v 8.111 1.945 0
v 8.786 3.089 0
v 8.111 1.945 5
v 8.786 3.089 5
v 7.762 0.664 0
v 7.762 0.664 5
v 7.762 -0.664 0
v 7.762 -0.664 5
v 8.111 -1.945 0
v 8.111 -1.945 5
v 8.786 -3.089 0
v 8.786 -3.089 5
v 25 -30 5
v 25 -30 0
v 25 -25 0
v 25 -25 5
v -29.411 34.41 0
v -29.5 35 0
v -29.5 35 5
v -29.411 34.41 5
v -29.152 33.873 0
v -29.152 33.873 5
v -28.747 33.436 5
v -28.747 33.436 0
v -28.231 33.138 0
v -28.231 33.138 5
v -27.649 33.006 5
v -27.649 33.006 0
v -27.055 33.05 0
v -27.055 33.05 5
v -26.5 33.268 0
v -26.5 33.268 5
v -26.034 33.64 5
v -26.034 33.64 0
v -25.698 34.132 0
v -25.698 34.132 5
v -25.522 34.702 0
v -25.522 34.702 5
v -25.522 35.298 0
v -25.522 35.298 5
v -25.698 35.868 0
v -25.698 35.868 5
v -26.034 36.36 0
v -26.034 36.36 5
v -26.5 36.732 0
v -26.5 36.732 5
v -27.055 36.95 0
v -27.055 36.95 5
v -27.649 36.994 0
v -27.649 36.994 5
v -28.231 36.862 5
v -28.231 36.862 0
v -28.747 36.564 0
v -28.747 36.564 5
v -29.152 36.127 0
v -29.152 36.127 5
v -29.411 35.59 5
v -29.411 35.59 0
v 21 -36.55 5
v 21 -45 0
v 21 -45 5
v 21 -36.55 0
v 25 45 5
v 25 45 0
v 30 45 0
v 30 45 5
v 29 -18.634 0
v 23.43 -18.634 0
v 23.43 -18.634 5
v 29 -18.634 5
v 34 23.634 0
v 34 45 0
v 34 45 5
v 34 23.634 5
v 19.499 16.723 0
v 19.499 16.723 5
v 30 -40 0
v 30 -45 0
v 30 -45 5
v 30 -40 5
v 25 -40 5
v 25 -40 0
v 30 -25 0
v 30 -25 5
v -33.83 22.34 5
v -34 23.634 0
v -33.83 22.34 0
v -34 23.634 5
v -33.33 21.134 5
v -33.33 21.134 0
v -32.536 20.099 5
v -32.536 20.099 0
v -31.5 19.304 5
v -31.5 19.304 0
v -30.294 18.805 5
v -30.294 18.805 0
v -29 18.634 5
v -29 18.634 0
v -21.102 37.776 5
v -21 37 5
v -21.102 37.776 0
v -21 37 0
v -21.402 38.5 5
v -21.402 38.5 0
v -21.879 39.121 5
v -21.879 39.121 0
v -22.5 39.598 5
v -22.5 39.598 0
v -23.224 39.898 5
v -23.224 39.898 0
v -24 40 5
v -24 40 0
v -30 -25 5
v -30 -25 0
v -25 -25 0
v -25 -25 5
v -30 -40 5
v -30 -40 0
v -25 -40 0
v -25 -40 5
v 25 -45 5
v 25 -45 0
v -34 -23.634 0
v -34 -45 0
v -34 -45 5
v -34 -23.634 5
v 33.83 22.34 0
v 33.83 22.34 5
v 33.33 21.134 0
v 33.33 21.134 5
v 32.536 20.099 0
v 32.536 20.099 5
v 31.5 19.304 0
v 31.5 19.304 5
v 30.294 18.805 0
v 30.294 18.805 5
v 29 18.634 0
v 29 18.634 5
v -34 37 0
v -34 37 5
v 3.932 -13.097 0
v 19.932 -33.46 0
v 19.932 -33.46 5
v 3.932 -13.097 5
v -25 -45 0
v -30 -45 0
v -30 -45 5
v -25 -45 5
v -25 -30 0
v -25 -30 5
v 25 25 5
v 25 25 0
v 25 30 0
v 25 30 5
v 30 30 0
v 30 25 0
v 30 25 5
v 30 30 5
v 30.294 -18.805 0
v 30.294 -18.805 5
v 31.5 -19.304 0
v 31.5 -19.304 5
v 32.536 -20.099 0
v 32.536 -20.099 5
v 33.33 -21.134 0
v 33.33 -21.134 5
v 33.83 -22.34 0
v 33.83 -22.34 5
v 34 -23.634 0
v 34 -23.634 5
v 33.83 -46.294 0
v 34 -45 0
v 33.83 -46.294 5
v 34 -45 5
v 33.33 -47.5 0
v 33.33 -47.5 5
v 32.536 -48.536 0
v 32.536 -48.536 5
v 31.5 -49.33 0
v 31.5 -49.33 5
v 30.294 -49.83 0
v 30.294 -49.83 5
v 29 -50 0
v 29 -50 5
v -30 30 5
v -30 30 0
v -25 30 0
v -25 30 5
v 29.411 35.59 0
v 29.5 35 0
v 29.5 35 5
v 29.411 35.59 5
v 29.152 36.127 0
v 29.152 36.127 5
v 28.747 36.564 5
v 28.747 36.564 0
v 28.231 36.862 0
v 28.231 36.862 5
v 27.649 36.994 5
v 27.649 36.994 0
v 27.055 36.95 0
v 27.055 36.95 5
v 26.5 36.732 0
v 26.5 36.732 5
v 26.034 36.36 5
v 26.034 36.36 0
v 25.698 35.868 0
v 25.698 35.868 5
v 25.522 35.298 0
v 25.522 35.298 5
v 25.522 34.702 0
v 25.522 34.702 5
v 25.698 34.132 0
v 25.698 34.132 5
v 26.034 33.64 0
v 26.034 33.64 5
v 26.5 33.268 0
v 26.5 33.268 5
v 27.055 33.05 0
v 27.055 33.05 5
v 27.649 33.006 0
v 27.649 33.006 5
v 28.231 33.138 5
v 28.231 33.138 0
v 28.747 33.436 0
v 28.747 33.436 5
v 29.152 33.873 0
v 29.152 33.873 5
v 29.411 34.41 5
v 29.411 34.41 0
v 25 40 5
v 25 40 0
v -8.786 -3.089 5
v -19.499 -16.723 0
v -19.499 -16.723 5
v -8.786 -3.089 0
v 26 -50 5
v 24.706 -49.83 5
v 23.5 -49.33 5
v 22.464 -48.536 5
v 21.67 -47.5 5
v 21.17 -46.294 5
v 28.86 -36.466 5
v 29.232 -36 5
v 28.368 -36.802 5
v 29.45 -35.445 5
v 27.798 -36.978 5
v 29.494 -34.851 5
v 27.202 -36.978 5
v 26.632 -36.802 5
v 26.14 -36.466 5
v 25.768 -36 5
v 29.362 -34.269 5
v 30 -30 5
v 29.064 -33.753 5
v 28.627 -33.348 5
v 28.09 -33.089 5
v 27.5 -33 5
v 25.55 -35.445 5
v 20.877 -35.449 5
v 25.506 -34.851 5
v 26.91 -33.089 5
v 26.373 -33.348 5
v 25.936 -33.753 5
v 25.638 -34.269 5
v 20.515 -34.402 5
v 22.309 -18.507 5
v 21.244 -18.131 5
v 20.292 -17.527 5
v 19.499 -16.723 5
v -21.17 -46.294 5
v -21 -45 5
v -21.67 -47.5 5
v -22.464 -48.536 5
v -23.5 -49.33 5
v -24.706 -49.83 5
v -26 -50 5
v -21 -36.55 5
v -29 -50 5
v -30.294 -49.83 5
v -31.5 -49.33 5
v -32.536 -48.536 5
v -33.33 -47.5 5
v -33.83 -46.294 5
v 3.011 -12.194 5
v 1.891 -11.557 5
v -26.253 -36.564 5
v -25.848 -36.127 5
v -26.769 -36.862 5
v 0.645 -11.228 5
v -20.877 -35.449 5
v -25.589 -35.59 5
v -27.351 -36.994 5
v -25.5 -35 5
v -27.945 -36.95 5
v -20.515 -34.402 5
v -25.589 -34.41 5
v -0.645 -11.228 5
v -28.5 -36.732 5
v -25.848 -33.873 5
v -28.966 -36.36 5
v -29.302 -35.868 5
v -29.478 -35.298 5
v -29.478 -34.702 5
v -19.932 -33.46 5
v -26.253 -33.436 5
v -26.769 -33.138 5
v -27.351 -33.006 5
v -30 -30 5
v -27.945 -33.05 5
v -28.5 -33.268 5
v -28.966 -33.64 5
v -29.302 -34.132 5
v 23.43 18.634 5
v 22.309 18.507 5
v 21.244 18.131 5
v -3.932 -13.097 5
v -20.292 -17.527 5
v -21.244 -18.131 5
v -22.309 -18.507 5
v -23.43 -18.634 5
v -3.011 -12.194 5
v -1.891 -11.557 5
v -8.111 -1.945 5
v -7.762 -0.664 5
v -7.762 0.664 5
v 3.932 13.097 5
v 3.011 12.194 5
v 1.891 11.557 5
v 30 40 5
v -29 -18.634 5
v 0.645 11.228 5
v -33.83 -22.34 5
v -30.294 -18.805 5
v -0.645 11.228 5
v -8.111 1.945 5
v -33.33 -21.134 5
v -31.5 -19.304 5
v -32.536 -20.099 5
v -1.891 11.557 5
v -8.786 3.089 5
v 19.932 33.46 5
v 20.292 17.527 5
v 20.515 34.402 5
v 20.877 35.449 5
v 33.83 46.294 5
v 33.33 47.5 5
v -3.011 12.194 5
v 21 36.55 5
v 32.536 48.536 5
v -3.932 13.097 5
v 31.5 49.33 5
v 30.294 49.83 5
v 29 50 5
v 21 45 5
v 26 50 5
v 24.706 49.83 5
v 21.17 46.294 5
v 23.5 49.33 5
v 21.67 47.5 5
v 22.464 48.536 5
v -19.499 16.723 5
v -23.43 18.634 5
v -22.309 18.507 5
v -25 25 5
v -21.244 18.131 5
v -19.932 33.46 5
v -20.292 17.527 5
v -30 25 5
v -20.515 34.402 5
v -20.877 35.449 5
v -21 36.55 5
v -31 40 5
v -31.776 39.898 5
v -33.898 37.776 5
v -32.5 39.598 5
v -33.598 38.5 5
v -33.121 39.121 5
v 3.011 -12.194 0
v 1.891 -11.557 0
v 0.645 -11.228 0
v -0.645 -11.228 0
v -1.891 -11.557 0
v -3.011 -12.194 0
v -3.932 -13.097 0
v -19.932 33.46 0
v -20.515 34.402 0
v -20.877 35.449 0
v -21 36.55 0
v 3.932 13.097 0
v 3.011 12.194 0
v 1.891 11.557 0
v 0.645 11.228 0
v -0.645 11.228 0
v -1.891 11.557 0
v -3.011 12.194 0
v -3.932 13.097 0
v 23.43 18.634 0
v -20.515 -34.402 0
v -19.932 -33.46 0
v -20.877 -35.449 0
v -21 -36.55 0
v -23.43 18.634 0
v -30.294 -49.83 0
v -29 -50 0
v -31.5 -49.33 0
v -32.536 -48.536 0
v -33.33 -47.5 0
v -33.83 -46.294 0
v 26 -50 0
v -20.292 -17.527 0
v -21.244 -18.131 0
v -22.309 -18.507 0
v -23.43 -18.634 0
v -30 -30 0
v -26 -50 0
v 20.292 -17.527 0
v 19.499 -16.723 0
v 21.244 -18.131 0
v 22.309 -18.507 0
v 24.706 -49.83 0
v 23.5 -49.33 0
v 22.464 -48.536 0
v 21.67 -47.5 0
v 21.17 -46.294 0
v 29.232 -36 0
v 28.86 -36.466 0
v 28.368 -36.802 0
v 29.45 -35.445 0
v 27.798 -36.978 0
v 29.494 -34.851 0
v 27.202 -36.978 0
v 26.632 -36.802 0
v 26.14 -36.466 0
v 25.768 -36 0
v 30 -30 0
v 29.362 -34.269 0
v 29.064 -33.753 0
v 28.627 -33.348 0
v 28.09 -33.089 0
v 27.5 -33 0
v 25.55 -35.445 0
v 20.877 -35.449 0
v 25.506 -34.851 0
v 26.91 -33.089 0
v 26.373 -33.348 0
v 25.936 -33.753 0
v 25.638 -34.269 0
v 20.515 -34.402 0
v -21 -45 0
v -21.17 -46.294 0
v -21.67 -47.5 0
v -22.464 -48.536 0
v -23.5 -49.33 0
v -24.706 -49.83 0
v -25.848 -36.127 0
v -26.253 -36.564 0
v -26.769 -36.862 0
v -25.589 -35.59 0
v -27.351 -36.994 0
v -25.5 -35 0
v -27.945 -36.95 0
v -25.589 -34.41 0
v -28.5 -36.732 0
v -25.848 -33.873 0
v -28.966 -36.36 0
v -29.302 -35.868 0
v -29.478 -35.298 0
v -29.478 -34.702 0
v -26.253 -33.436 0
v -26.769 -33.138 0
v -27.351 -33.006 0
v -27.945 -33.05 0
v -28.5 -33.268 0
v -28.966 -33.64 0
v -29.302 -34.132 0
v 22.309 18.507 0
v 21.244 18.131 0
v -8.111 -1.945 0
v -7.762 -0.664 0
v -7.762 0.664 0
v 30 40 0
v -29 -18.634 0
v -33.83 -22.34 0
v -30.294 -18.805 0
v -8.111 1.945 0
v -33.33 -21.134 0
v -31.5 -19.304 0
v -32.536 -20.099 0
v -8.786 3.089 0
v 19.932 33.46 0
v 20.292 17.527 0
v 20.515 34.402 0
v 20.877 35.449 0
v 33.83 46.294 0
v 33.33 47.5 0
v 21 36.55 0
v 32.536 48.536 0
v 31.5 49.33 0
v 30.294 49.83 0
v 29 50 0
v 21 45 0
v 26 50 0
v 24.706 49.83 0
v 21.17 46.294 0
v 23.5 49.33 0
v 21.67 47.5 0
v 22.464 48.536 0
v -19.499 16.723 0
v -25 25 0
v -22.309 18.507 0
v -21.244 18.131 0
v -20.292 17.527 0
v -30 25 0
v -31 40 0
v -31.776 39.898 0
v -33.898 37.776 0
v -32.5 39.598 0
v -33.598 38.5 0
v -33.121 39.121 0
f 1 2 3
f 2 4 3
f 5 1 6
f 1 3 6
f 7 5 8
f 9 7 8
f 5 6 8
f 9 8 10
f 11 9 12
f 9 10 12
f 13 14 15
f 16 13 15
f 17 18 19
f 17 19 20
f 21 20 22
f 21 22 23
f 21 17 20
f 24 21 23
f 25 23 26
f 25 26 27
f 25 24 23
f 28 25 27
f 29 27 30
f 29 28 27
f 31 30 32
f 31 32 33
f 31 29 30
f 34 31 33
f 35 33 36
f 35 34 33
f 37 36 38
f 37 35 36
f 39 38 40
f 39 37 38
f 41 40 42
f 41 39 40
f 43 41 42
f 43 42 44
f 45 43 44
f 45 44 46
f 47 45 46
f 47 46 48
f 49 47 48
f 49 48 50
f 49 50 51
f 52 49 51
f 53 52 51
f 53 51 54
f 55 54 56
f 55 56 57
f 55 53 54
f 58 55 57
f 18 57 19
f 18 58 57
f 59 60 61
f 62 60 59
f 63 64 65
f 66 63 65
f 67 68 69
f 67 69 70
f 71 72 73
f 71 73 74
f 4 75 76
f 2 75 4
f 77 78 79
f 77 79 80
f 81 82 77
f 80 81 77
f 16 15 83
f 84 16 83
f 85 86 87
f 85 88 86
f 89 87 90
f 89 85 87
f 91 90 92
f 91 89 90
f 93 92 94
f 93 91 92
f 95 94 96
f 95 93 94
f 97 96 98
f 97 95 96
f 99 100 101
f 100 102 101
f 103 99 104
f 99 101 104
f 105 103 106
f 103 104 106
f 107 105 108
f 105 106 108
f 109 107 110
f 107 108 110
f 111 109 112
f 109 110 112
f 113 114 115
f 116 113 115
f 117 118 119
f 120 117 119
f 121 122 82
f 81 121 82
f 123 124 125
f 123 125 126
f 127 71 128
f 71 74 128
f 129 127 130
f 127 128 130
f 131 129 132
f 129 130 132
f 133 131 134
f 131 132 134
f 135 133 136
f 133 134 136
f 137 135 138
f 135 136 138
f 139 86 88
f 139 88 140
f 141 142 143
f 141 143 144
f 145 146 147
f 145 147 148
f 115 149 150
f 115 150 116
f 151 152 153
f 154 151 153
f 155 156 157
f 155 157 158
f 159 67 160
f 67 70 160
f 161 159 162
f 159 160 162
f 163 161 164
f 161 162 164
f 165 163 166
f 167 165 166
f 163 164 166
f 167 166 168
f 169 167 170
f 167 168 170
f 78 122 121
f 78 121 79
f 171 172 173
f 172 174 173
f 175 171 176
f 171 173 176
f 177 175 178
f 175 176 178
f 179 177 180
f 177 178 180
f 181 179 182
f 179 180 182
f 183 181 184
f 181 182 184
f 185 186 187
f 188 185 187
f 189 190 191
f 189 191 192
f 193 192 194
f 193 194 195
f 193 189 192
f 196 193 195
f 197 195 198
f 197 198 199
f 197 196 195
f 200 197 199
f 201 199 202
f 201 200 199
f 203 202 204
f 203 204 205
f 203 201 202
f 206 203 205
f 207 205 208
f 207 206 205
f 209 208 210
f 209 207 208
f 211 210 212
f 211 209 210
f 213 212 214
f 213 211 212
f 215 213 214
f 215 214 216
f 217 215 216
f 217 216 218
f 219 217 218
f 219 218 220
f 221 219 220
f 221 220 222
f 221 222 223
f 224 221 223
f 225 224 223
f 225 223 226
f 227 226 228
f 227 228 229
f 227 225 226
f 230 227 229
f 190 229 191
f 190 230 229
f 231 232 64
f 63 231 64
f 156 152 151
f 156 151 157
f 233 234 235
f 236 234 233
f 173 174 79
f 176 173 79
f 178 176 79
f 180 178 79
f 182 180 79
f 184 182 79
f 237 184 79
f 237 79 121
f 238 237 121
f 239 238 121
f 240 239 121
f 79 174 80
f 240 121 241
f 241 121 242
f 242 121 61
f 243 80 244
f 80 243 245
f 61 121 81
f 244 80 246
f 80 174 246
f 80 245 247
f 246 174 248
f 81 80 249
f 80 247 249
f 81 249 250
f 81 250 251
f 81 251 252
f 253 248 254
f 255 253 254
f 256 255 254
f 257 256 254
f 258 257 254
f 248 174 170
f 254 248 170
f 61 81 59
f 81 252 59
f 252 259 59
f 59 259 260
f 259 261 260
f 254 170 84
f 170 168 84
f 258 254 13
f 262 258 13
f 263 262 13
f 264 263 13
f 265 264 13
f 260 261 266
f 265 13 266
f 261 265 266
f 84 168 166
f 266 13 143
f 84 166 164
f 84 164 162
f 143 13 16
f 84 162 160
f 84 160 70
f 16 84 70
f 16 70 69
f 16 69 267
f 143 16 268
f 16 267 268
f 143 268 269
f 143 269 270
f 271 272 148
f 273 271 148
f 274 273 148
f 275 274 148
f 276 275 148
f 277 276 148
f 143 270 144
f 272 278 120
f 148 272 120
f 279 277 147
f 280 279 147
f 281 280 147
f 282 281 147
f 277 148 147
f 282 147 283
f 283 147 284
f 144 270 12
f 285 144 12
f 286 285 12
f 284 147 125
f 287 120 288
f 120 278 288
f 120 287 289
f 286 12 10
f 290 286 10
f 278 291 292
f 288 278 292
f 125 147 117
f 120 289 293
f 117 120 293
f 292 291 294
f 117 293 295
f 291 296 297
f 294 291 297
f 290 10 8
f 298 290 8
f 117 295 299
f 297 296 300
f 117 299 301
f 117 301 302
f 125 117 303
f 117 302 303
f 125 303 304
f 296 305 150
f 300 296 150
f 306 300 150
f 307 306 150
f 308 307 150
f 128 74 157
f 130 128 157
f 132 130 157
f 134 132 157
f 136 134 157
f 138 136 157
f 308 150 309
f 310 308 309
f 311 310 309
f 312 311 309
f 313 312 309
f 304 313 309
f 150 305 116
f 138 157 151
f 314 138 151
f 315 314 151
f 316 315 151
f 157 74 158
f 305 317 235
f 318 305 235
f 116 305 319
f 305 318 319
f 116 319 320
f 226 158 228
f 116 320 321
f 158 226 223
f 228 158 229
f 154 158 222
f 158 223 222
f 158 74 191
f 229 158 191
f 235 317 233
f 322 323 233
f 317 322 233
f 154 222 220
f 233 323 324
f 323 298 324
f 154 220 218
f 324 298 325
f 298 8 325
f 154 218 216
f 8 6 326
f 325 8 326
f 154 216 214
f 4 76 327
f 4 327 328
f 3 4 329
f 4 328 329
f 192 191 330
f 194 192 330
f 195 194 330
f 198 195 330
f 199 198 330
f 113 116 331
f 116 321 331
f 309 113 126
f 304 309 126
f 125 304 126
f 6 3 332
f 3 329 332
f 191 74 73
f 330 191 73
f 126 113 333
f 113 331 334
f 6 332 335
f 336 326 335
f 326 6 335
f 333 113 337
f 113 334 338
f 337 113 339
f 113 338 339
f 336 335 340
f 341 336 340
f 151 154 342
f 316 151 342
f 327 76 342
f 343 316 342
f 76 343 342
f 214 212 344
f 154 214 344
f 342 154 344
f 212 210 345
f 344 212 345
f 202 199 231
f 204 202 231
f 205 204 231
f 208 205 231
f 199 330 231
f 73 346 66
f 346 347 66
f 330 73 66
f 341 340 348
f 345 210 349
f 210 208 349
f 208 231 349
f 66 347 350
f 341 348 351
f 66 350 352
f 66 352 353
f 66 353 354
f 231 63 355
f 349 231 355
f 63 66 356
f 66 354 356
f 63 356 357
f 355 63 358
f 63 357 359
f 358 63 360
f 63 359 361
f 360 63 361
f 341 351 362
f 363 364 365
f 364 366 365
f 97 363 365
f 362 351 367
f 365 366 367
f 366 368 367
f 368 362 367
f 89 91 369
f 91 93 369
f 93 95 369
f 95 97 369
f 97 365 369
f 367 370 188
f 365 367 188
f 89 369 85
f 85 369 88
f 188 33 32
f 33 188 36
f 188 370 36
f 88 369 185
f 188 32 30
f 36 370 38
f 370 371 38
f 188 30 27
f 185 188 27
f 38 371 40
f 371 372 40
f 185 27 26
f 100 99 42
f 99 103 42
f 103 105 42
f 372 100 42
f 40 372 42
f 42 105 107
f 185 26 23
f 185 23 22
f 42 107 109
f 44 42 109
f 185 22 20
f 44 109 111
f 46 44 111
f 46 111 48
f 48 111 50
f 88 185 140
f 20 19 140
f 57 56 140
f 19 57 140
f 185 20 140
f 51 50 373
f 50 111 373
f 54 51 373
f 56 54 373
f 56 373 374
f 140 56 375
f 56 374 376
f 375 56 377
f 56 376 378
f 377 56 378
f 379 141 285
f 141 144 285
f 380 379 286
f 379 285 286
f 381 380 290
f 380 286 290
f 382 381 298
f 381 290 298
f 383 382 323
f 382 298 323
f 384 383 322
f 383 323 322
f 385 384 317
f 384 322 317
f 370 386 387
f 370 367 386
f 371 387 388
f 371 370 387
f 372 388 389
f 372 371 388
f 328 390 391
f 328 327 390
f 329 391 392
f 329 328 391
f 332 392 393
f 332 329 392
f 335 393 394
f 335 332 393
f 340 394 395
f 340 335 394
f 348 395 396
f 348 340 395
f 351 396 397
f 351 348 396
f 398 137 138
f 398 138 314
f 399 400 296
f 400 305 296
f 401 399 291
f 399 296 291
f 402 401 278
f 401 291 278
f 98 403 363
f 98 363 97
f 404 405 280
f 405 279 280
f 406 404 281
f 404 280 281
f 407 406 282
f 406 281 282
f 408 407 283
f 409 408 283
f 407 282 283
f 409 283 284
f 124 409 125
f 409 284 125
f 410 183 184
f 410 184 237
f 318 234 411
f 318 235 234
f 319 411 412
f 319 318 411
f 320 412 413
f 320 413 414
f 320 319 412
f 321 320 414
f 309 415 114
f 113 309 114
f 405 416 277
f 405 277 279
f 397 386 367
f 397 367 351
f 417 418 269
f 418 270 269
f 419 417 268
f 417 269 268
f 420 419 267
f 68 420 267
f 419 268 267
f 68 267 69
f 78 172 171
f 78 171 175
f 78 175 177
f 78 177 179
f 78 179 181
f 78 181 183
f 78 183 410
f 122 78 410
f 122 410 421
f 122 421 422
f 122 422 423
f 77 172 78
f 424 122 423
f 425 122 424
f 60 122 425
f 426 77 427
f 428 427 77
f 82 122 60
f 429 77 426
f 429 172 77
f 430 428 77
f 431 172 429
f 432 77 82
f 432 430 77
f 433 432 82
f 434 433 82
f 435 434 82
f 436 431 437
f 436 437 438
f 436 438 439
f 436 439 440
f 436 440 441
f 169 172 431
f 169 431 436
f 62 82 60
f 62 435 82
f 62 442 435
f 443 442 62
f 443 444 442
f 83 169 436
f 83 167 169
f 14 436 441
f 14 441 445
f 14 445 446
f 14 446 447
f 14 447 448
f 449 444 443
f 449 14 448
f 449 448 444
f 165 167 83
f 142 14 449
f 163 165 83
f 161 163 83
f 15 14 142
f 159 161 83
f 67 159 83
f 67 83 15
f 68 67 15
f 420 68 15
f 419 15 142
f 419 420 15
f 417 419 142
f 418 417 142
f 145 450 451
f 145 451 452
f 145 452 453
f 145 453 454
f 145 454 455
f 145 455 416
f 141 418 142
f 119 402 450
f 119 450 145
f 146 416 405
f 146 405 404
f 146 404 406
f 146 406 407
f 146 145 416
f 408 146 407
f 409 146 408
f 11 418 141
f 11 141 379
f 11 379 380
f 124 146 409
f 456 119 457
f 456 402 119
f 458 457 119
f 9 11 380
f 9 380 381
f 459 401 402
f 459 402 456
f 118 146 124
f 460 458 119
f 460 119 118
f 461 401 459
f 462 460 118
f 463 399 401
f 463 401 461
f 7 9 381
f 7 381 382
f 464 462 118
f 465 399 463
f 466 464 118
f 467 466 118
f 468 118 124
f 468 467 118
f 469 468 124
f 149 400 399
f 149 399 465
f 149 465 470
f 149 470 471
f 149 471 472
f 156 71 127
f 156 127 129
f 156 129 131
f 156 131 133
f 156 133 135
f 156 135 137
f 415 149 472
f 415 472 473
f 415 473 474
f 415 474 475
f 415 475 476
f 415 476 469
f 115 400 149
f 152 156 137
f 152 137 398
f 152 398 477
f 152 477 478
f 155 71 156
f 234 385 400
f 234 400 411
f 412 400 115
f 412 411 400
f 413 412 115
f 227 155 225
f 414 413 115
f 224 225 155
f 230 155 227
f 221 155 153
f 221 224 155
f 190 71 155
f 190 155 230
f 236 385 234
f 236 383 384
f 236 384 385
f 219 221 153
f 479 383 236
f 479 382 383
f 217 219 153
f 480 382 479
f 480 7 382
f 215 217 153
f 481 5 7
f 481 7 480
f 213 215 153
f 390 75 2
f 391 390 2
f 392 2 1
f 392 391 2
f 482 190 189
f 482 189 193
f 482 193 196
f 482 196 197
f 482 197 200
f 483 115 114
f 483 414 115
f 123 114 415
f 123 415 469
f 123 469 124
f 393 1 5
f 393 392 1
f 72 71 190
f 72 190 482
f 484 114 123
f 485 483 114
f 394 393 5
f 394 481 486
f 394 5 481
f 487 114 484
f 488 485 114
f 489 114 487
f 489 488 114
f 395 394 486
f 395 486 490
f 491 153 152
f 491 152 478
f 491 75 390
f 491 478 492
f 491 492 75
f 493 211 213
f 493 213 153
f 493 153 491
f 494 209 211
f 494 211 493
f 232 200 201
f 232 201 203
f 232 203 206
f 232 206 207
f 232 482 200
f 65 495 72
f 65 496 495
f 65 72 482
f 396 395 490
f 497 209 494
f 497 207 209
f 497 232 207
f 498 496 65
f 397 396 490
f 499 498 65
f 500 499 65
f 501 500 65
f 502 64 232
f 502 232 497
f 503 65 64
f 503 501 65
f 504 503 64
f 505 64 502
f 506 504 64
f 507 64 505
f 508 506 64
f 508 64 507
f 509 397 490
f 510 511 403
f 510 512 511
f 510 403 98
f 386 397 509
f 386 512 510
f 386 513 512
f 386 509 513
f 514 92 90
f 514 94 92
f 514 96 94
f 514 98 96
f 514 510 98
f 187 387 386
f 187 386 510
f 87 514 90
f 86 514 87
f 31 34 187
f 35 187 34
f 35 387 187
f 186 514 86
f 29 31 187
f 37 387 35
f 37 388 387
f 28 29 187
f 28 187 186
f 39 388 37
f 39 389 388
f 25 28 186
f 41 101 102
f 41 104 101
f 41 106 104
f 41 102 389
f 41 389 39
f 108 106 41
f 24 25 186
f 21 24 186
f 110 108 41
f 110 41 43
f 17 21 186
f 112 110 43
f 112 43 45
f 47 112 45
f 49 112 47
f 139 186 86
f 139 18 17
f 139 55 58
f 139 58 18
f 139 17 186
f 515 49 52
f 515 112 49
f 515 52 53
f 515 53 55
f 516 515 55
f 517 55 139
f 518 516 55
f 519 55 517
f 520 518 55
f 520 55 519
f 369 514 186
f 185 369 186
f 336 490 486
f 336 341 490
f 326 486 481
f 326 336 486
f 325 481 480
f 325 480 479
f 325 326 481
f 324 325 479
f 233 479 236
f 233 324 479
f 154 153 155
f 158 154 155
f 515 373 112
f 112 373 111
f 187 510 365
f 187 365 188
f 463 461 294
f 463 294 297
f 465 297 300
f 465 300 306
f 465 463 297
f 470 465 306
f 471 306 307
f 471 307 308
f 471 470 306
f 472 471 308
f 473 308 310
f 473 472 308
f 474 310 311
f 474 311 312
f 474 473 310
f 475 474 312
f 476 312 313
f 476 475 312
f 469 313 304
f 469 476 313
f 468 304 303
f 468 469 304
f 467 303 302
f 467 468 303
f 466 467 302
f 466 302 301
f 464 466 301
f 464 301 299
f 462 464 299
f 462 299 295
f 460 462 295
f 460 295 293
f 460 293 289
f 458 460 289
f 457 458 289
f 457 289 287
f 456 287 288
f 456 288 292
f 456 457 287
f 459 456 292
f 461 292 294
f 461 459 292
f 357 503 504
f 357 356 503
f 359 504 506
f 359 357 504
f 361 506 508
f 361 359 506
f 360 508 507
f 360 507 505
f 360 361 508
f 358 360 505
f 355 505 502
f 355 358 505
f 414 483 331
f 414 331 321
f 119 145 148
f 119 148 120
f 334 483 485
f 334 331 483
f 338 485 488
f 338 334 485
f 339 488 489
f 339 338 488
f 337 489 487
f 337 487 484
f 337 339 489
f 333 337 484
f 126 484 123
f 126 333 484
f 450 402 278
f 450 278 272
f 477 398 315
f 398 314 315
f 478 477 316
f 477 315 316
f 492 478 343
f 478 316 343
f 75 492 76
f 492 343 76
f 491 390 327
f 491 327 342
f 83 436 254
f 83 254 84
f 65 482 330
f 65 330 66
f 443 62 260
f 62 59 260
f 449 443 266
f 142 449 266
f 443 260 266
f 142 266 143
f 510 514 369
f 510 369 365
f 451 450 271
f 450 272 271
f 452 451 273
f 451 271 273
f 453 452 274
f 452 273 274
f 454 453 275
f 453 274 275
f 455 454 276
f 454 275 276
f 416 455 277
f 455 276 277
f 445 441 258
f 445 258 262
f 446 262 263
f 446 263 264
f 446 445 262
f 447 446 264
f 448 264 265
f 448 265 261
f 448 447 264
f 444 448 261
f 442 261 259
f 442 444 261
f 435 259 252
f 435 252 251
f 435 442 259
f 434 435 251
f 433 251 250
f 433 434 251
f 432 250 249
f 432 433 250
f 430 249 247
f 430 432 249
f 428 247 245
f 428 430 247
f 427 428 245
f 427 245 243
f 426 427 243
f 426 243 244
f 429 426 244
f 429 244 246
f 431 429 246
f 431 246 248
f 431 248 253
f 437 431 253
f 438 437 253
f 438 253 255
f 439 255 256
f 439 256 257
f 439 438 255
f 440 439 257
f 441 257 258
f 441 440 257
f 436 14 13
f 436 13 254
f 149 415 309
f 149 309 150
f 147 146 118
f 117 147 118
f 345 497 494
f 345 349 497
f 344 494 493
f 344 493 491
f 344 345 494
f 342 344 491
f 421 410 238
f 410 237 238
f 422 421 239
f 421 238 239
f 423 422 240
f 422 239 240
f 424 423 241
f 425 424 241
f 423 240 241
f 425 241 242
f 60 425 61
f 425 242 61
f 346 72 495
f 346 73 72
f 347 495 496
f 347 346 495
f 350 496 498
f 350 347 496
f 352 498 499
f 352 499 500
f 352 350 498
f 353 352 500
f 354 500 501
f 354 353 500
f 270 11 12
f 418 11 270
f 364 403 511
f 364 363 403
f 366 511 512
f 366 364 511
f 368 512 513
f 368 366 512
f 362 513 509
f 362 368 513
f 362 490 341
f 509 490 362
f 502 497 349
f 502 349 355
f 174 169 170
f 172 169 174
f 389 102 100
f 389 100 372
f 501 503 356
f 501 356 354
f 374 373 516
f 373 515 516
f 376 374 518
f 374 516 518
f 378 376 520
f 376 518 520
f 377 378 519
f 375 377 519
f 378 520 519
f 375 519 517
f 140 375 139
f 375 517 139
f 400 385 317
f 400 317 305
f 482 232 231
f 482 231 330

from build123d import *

# Parameters (mm, degrees)
ESQUISSE1_R             = 2
ESQUISSE1_W             = 5
ESQUISSE1_H             = 5
BOSS_EXTRU_1_DEPTH      = 5
CONG_1_R                = 5
ESQUISSE2_W             = 13
ESQUISSE2_H             = 10
ENL_V_MAT_EXTRU_1_DEPTH = 61.671245248
CONG_2_R                = 3


with BuildPart() as part:
    # Esquisse1 → Boss.-Extru.1 (new body)
    with BuildSketch(Plane.XY):
        Polygon((34, 50), (34, 18.634320993), (21, 18.634320993), (6.358747791, 0), (21, -18.634320993), (34, -18.634320993), (34, -50), (21, -50), (21, -34.820224461), (0, -8.092951734), (-21, -34.820224461), (-21, -50), (-34, -50), (-34, -18.634320993), (-21, -18.634320993), (-6.358747791, 0), (-21, 18.634320993), (-34, 18.634320993), (-34, 50), (-21, 50), (-21, 34.820224461), (0, 8.092951734), (21, 34.820224461), (21, 50), align=None)
        with Locations((27.5, 35)):
            Circle(ESQUISSE1_R, mode=Mode.SUBTRACT)
        with Locations(Location((-27.5, 35, 0), (0, 0, 180))):
            Circle(ESQUISSE1_R, mode=Mode.SUBTRACT)
        with Locations((-27.5, -35)):
            Circle(ESQUISSE1_R, mode=Mode.SUBTRACT)
        with Locations(Location((27.5, -35, 0), (0, 0, 90))):
            Circle(ESQUISSE1_R, mode=Mode.SUBTRACT)
        with Locations((27.5, 27.5)):
            Rectangle(ESQUISSE1_W, ESQUISSE1_H, mode=Mode.SUBTRACT)
        with Locations((27.5, 42.5)):
            Rectangle(ESQUISSE1_W, ESQUISSE1_H, mode=Mode.SUBTRACT)
        with Locations((-27.5, 27.5)):
            Rectangle(ESQUISSE1_W, ESQUISSE1_H, mode=Mode.SUBTRACT)
        with Locations((-27.5, 42.5)):
            Rectangle(ESQUISSE1_W, ESQUISSE1_H, mode=Mode.SUBTRACT)
        with Locations((-27.5, -27.5)):
            Rectangle(ESQUISSE1_W, ESQUISSE1_H, mode=Mode.SUBTRACT)
        with Locations((-27.5, -42.5)):
            Rectangle(ESQUISSE1_W, ESQUISSE1_H, mode=Mode.SUBTRACT)
        with Locations((27.5, -27.5)):
            Rectangle(ESQUISSE1_W, ESQUISSE1_H, mode=Mode.SUBTRACT)
        with Locations((27.5, -42.5)):
            Rectangle(ESQUISSE1_W, ESQUISSE1_H, mode=Mode.SUBTRACT)
    extrude(amount=BOSS_EXTRU_1_DEPTH)

    # Congé1
    cong_1_edges = [part.edges().sort_by_distance(p)[0] for p in [
        (34, 50, 2.5),
        (34, 18.634320993, 2.5),
        (21, 18.634320993, 2.5),
        (6.358747791, 0, 2.5),
        (21, -18.634320993, 2.5),
        (34, -18.634320993, 2.5),
        (34, -50, 2.5),
        (21, -50, 2.5),
        (21, -34.820224461, 2.5),
        (0, -8.092951734, 2.5),
        (-21, -34.820224461, 2.5),
        (-21, -50, 2.5),
        (-34, -50, 2.5),
        (-34, -18.634320993, 2.5),
        (-21, -18.634320993, 2.5),
        (-6.358747791, 0, 2.5),
        (-21, 18.634320993, 2.5),
        (-34, 18.634320993, 2.5),
        (-34, 50, 2.5),
        (-21, 50, 2.5),
        (-21, 34.820224461, 2.5),
        (0, 8.092951734, 2.5),
        (21, 34.820224461, 2.5),
        (21, 50, 2.5),
    ]]
    fillet(cong_1_edges, radius=CONG_1_R)

    # Esquisse2 → Enlèv. mat.-Extru.1 (cut, through all)
    with BuildSketch(Plane.XY.offset(5)):
        with Locations((-27.5, 45)):
            Rectangle(ESQUISSE2_W, ESQUISSE2_H)
    extrude(amount=-ENL_V_MAT_EXTRU_1_DEPTH, mode=Mode.SUBTRACT)

    # Congé2
    cong_2_edges = [part.edges().sort_by_distance(p)[0] for p in [
        (-21, 40, 2.5),
        (-34, 40, 2.5),
    ]]
    fillet(cong_2_edges, radius=CONG_2_R)


solid = part.part
